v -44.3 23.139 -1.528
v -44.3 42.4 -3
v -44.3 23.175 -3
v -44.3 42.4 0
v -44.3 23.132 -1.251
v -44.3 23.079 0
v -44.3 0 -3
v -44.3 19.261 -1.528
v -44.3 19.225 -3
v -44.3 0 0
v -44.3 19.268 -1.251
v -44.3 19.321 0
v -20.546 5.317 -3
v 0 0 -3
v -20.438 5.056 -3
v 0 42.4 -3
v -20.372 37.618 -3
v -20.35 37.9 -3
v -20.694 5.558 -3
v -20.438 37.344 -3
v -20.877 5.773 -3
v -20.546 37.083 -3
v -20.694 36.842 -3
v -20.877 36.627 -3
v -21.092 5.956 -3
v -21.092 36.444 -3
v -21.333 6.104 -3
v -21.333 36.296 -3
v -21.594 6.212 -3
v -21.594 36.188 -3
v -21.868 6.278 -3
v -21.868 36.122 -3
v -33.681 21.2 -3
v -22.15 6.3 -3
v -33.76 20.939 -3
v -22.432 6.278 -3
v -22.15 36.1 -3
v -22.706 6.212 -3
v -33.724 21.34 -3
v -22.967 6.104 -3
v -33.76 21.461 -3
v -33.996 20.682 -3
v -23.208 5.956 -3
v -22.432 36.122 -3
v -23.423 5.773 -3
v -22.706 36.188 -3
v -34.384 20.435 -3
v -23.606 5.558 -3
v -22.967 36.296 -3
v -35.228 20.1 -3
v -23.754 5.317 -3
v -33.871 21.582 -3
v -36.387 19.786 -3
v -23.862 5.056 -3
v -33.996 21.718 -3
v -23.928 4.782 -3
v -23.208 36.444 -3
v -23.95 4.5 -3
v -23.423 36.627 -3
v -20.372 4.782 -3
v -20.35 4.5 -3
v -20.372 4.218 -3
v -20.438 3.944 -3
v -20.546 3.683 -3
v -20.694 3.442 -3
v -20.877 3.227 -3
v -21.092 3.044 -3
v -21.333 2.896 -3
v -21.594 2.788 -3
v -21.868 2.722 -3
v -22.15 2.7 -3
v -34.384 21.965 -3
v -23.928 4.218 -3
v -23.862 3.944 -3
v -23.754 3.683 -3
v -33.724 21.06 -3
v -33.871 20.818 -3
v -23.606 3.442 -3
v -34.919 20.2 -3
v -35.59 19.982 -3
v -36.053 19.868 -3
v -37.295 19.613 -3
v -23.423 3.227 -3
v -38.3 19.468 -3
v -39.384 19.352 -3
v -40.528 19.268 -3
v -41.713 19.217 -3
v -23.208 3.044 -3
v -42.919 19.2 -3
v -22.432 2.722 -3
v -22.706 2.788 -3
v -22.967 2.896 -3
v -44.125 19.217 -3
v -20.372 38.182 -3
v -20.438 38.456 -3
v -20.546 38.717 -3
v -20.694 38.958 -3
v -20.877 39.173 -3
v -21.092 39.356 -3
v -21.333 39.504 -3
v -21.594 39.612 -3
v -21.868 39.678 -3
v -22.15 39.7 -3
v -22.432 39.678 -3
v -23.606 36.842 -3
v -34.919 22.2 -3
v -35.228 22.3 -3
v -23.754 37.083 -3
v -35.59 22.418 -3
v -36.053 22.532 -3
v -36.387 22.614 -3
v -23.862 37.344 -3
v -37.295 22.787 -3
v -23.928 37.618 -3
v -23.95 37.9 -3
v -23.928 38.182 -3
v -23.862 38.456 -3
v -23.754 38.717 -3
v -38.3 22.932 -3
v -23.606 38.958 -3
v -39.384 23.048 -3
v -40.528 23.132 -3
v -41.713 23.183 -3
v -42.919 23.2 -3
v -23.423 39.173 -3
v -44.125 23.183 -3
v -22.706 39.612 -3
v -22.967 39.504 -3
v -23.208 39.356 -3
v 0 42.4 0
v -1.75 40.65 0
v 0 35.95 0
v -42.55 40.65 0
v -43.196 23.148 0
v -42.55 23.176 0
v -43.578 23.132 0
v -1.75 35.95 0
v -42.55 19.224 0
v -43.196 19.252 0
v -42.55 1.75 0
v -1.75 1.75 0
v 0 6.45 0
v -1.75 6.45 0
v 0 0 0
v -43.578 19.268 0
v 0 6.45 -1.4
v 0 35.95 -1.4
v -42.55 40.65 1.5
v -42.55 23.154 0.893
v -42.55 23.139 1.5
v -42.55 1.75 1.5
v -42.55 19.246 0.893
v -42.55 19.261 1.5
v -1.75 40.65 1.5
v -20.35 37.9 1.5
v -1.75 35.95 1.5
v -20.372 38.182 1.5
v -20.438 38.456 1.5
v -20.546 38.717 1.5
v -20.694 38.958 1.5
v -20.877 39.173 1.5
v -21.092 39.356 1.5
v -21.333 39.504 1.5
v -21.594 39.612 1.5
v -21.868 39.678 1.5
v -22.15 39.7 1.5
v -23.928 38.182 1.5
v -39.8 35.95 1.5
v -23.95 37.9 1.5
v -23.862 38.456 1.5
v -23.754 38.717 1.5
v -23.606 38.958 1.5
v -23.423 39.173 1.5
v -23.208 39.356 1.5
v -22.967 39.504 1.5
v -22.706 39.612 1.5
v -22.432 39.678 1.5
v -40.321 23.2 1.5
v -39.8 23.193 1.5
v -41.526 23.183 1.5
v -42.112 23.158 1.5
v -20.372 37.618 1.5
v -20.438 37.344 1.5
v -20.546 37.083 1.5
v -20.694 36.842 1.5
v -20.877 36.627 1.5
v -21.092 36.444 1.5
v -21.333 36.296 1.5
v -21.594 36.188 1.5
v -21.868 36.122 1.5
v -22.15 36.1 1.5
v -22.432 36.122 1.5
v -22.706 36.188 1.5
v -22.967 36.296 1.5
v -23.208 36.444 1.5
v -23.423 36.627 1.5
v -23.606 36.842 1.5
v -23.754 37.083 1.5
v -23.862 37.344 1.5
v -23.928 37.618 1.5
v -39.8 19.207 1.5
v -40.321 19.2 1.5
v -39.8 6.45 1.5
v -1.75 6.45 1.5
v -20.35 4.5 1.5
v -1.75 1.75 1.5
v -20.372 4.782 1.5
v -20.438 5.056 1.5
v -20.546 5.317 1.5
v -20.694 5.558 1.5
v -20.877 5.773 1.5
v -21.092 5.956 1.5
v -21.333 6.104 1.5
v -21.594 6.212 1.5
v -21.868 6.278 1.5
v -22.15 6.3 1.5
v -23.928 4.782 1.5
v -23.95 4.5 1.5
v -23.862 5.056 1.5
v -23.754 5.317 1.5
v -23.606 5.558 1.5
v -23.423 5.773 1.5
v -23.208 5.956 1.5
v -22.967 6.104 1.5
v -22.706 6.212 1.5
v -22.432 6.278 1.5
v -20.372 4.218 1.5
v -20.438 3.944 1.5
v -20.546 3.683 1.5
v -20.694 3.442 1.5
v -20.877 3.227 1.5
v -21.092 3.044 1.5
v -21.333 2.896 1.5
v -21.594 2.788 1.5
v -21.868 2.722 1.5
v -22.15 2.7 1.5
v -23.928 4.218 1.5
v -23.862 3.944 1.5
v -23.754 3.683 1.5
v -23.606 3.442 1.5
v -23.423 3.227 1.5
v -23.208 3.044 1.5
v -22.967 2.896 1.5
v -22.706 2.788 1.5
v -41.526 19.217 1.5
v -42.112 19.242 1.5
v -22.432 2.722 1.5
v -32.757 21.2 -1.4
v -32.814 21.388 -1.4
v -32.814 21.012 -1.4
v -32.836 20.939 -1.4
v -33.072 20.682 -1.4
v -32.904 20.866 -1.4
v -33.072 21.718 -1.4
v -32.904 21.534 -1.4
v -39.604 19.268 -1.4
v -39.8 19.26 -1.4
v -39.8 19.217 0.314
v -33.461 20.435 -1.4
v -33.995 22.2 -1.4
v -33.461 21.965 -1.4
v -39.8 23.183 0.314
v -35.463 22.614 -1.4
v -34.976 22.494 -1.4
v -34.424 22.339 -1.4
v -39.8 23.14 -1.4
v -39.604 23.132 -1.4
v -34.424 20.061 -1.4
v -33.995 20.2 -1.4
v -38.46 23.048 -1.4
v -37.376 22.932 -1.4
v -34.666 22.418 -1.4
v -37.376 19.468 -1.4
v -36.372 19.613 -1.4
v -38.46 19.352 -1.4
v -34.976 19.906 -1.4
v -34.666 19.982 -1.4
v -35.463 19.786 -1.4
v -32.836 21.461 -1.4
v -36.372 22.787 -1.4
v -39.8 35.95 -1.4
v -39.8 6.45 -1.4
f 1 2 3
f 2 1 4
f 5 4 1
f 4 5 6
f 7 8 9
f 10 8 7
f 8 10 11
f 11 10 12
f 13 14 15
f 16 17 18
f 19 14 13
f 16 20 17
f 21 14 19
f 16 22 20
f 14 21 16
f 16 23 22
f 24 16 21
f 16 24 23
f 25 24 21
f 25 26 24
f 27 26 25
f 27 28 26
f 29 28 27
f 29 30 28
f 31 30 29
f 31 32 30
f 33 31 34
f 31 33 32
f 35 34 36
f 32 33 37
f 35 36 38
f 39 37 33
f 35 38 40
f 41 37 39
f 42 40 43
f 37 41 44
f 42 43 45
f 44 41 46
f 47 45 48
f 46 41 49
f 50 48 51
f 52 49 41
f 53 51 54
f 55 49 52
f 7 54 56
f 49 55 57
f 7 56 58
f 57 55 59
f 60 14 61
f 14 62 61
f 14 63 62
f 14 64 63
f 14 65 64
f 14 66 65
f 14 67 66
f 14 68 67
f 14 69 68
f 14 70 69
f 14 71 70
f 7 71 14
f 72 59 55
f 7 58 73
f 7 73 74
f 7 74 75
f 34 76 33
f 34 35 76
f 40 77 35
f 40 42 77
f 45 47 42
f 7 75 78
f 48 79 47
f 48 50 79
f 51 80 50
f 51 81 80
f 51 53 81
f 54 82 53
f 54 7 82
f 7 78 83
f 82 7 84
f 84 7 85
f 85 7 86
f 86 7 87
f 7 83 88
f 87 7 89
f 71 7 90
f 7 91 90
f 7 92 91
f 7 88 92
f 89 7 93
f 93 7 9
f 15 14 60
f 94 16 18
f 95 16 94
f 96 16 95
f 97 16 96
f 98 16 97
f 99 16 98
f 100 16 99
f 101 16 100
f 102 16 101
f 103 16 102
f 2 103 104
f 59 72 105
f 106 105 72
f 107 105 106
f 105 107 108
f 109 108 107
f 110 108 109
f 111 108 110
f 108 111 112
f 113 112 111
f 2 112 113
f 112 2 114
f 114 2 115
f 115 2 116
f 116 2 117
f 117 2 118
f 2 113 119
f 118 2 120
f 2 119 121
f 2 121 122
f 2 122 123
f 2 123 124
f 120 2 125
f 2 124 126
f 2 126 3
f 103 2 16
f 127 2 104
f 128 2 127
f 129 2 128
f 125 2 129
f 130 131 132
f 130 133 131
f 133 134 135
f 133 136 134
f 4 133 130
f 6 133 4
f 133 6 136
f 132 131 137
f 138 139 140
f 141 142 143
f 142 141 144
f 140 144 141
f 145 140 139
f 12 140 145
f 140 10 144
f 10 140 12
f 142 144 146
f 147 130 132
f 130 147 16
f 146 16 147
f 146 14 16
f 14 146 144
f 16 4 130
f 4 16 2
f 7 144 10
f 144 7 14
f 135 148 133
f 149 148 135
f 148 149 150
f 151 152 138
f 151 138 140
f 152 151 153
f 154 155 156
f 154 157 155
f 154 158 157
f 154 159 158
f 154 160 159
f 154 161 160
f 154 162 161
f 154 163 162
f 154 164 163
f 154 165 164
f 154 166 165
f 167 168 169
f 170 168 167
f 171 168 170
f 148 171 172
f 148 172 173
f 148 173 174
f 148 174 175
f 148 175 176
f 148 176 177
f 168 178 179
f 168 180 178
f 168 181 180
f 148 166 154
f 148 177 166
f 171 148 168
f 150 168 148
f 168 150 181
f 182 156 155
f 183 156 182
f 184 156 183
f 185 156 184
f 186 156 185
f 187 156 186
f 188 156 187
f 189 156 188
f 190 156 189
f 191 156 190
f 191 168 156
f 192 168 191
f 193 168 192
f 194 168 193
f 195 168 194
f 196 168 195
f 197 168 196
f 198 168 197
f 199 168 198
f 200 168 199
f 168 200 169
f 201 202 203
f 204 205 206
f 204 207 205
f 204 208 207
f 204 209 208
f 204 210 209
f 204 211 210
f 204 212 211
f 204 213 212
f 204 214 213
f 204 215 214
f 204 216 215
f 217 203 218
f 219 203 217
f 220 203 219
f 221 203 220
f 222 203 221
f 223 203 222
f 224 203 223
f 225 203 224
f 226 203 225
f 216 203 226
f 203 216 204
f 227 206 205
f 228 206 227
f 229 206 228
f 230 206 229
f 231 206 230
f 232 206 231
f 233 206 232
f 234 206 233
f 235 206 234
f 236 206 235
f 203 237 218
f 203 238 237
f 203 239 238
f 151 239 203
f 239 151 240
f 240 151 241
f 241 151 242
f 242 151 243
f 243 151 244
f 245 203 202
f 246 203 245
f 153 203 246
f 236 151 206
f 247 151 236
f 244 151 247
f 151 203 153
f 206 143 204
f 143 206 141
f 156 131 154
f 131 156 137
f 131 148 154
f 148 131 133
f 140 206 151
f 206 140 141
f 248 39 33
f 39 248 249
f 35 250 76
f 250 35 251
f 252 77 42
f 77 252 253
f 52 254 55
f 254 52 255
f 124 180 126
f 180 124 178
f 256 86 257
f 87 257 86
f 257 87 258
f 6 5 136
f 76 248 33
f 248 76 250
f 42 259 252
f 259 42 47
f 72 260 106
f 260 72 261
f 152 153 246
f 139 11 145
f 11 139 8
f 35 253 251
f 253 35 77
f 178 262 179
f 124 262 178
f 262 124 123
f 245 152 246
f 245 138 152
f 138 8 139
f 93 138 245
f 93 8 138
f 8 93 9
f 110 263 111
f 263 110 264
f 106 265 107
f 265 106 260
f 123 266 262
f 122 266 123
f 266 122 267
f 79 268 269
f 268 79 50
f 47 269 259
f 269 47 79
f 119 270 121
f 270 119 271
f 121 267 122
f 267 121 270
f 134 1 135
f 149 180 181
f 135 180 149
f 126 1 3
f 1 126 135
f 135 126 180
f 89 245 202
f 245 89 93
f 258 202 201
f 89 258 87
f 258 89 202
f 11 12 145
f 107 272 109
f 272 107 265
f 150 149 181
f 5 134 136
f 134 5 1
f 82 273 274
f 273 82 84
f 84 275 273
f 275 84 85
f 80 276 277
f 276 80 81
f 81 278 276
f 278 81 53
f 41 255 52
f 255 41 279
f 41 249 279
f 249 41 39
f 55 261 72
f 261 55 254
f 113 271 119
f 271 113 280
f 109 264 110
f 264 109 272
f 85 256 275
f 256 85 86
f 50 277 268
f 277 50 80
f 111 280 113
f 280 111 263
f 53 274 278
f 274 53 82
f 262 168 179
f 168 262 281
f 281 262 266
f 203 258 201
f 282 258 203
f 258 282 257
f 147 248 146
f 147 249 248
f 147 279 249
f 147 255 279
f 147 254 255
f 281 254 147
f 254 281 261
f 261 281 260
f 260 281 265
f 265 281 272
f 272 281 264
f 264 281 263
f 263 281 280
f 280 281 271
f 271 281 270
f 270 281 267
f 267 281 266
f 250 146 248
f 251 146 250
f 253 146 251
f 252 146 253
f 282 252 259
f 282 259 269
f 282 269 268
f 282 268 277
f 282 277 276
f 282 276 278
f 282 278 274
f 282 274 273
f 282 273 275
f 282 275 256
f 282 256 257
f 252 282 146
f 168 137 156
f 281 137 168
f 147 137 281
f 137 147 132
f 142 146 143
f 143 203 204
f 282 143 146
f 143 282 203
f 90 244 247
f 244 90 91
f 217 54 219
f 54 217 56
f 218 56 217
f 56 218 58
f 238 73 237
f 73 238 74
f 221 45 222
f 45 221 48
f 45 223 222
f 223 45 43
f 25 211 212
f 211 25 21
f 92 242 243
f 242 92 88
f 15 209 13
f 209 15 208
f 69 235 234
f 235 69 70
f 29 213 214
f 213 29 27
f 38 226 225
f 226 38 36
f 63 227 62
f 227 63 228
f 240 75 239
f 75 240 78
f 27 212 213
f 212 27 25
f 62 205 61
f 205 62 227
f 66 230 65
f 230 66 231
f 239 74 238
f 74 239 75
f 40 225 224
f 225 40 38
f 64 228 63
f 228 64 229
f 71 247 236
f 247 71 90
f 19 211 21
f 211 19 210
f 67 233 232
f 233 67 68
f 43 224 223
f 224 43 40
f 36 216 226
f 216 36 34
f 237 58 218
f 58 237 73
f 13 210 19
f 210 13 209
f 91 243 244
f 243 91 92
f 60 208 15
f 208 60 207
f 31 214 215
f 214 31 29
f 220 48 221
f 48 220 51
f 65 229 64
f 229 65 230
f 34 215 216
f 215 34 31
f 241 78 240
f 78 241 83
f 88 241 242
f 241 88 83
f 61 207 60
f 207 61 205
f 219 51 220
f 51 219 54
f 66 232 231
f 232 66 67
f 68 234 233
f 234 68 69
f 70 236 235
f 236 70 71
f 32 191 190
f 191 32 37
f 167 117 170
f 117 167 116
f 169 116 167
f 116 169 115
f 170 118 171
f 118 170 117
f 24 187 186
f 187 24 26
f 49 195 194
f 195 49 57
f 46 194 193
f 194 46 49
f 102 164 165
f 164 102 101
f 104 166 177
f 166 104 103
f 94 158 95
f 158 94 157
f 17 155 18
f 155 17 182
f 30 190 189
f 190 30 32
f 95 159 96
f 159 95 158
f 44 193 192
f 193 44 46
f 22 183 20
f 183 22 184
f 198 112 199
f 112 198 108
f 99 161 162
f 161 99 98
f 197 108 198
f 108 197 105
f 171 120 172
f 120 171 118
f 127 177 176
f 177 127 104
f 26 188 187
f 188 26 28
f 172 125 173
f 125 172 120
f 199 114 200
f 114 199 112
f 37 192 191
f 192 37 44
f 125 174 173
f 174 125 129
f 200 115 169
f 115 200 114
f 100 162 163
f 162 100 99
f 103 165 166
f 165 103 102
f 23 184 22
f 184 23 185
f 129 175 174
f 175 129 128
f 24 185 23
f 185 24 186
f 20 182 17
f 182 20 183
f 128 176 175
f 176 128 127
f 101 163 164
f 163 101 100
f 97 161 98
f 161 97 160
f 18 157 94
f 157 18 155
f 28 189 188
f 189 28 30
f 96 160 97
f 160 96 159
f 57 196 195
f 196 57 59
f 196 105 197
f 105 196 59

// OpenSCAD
/*
modular enclosure for ESP32-S2 style of wemos D1 Mini 
current shell lid is for a style of relay 
MIT 
Copyright 2023 James Dodgen

Permission is hereby granted, free of charge, to any person obtaining a copy of this software and associated documentation files (the “Software”), 
to deal in the Software without restriction, including without limitation the rights to use, copy, modify, merge, publish, distribute, 
sublicense, and/or sell copies of the Software, and to permit persons to whom the Software is furnished to do so, subject to the following conditions:

The above copyright notice and this permission notice shall be included in all copies or substantial portions of the Software.

THE SOFTWARE IS PROVIDED “AS IS”, WITHOUT WARRANTY OF ANY KIND, EXPRESS OR IMPLIED, INCLUDING BUT NOT LIMITED TO THE WARRANTIES OF MERCHANTABILITY, 
FITNESS FOR A PARTICULAR PURPOSE AND NONINFRINGEMENT. IN NO EVENT SHALL THE AUTHORS OR COPYRIGHT HOLDERS BE LIABLE FOR ANY CLAIM, 
DAMAGES OR OTHER LIABILITY, WHETHER IN AN ACTION OF CONTRACT, TORT OR OTHERWISE, ARISING FROM, OUT OF OR IN 
CONNECTION WITH THE SOFTWARE OR THE USE OR OTHER DEALINGS IN THE SOFTWARE.

version 1.1
*/

type = "proto"; //"cpu"; "relay"; "proto";

make_somthing = 2;    // 1 base, 2=lid, 3 buttons
if (make_somthing == 1) {
    make_s2_base();
} else if (make_somthing == 2) {
    make_relay_lid();
} else if (make_somthing == 3) {
    make_button();
    translate([6,0,0]) 
        make_button(long=true); // two needed, short for the "O" long for the "RST"
}

Mx_fn = 12; // self tapping 
M3_screw_hole = 2.8; 
M3_clearence_hole = 3.6; 
M3_head_clearence_hole = 6.3;

M2_5_screw_hole = 2.7; 
M2_5_clearence_hole = 3.1; 
M2_5_head_clearence_hole = 6.2;

M2_screw_hole = 2.16; 
M2_clearence_hole = 2.6; 

drill_length = 20;


shell_x = 34.3 + 10;   // adjustments off of S2 D1 Mini
shell_y = 25.4 + 17;

shell_z = 20;
shell_wall_thickness = 1.5;
shell_post_d = 7;



module make_s2_base() {
    difference()
    {
        union()
        {
            make_s2_mini_mount(front_stops=false);
            translate([-(shell_x-s2_x)+shell_wall_thickness,(-(shell_y-s2_y)/2),0])
            {
                shell();
            }
        }
        make_s2_mini_mount_cutout();
    }
}

lid_mount_Loc_1 = [shell_x/2,shell_wall_thickness,shell_z-2];
lid_mount_Loc_2 = [shell_x/2,shell_y-shell_wall_thickness,shell_z-2];

//shell();
module shell()
{
    difference()
    {
        cube([shell_x, shell_y, shell_z]) ;
        translate([shell_wall_thickness, shell_wall_thickness ,shell_wall_thickness])
        {
            cube([shell_x - (shell_wall_thickness*2), shell_y-shell_wall_thickness*2, shell_z]);
        }
        mid_y = shell_y/2;
        make_slot([0,mid_y,3],height=shell_z-5);
        make_slot([0,mid_y+4,3],height=shell_z-5);
        make_slot([0,mid_y-4,3],height=shell_z-5);
        make_slot([0,mid_y+8,3],height=shell_z-5);
        make_slot([0,mid_y-8,3],height=shell_z-5);
        make_slot([0,mid_y-12,3],height=shell_z-5);
        make_slot([0,mid_y+12,3],height=shell_z-5);
        make_slot([0,mid_y-16,3],height=shell_z-5);
        make_slot([0,mid_y+16,3],height=shell_z-5);
        translate([33,0.5,9])
            rotate([90,0,0])
                center_text("R", size=5, extrude=1.2);
        translate([33,shell_y+0.7,9])
            rotate([90,0,0])
                center_text("O", size=5, extrude=1.2);       
        
    }
    lid_mount(lid_mount_Loc_1, rot=0);
    lid_mount(lid_mount_Loc_2, rot=180); 
}

//make_relay_lid();
module make_relay_lid()
{
    hat_x = 32;
    hat_y = 26.5;
    lip_depth = 1.9;
    shrinkage = 0.25;
    lip_width = 4.7;

    rotate([0,180.0])  // print upside down
    difference()
    {
        union()
        {
            difference()
            {
                slop = (shrinkage+shell_wall_thickness);
                lip_x = shell_x-slop*2;
                lip_y = shell_y-slop*2;
                union()
                {
                    color("orange") cube([shell_x, shell_y, shell_wall_thickness*2]);
                    if (type == "cpu")   // make usb-c hold down post
                    {
                        height= 9;
                        width=5;
                        translate([3,(shell_y-width)/2, -height]) cube([2,width,height]);
                    }
                    difference()
                    {
                        translate([shrinkage+shell_wall_thickness, shrinkage+shell_wall_thickness,-shell_wall_thickness])
                        {
                            color("green") cube([lip_x, lip_y, lip_depth]);
                        }
                    }
                }
                
                if (type == "relay" ||  type == "cpu")
                {
                    cut_out_x = lip_x-lip_width*2;
                    cut_out_y = lip_y-lip_width*2;
                    translate([shrinkage+shell_wall_thickness, shrinkage+shell_wall_thickness,-shell_wall_thickness+1])
                        translate([(lip_x-cut_out_x)/2,(lip_y-cut_out_y)/2,-shell_wall_thickness])
                                    cube([cut_out_x, cut_out_y, lip_depth+shell_wall_thickness]);
                }
                if (type == "relay") // cut out relay slot
                 {
                    translate([shell_x-hat_x,(shell_y - hat_y)/2,-10]) 
                        cube([hat_x, hat_y, 20]);
                 }
                if (type == "proto")  // add slot for some wires
                {
                    // cut wire hole
                    translate([shell_x-6,(shell_y)/2, -5]) 
                        rotate([0,30,0])
                            scale([4,1,1])
                                cylinder(h = 10, r = 2, $fn=48);
                    // make room for proto board
                    cut_out_x = lip_x;
                    cut_out_y = lip_y-lip_width*2;
                    translate([-1, shrinkage+shell_wall_thickness,-shell_wall_thickness+1])
                        translate([(lip_x-cut_out_x)/2,(lip_y-cut_out_y)/2,-shell_wall_thickness])
                                    cube([cut_out_x, cut_out_y, lip_depth+shell_wall_thickness]);
                }
                lid_mount_clearance_hole(lid_mount_Loc_1, rot=0);
                lid_mount_clearance_hole(lid_mount_Loc_2, rot=180);

            relay_y = 16.2;
            relay_x= 31;
            relay_z = 10;
            
            *difference()  // resess for pcb
            {
                translate([shell_x-relay_x-2,(shell_y - hat_y-2)/2,shell_wall_thickness+0.3]) 
                    color("blue") cube([relay_x+2,hat_y+2,-(shell_wall_thickness-0.3)]);
                translate([shell_x-relay_x,(shell_y - relay_y)/2,0]) 
                    cube([relay_x,relay_y,relay_z]);
            }
        }
        }
        if (type == "relay")
        {
            /// relay cut outs for led and letters
            *translate([0,0,drill_length/2+shell_wall_thickness]) {
                lid_mount_clearance_hole(lid_mount_Loc_1, rot=0,hole_size=M3_head_clearence_hole);
                lid_mount_clearance_hole(lid_mount_Loc_2, rot=180,hole_size=M3_head_clearence_hole); 
            }
            translate([41,7,2])
                rotate([0,0,90])
                    center_text("NO", size=5, extrude=2);  
            translate([41,35,2])
                rotate([0,0,90])
                    center_text("NC", size=5, extrude=1.2);  
            // LED cutout
            translate([35,30,-5])
                    cube([3,4,20]);
        } 
    }
}

module lid_mount(xyz,  width=6, height=8, rot=0) {
    
    echo ("rotate", rot);
    if (rot == 0) { 
        translate([xyz.x+width/2, xyz.y, xyz.z])
            rotate([0,180,rot])
                raw_lid_mount(width=6, height=8);
    } else if ((rot == -90) || (rot == 270 )) {
        translate([xyz.x, xyz.y-width/2, xyz.z])
            rotate([0,180,rot])
                raw_lid_mount(width=6, height=8);
    } else if (rot == 90) {
        translate([xyz.x, xyz.y+width/2, xyz.z])
            rotate([0,180,rot])
                raw_lid_mount(width=6, height=8);
    } else if (rot == 180) {
        translate([xyz.x-width/2, xyz.y, xyz.z])
            rotate([0,180,rot])
                raw_lid_mount(width=6, height=8);
    }
}

//lid_mount([10,10,-2], rot=180); 
//lid_mount_clearance_hole([10,10,-2], rot=180); 
module lid_mount_clearance_hole(xyz,  width=6, height=8, rot=0, hole_size=M3_clearence_hole) {
 
    echo ("rotate", rot);
    if (rot == 0) { 
        translate([xyz.x, xyz.y+width/2, -drill_length/2])
           cylinder(h=drill_length, d=hole_size, $fn=40);
    } else if ((rot == -90) || (rot == 270 )) {
        translate([xyz.x+width/2, xyz.y, -drill_length/2])
            cylinder(h=drill_length, d=hole_size, $fn=40);
    } else if (rot == 90) {
        translate([xyz.x-width/2, xyz.y, -drill_length/2])
            cylinder(h=drill_length, d=hole_size, $fn=40);
    } else if (rot == 180) {
        translate([xyz.x, xyz.y-width/2, -drill_length/2])
            cylinder(h=drill_length, d=hole_size, $fn=40);   
    }
}

//raw_lid_mount();
module raw_lid_mount(width=6, height=8) {
    raw_height =20;
    //screw_depth= height*0.75;
    difference() 
    { 
        cube([width, width,raw_height]);			
        // chop off at 45 
        rotate([-45,0,0]) 
            translate([0,-50,height])
                cube([width, 100, raw_height*2]);		
        // screw hole
        translate([width/2, width/2,-2]) 
            cylinder(h=raw_height, d=M3_screw_hole, $fn=Mx_fn);                  
        translate([width/2,width/2,-2]) 
            fillet(180,width/2, raw_height+2, $fn=30);
        translate([0,width/2,-2]) 
                fillet(-90,width/2, raw_height+2, $fn=30);
    }                   
}

*difference() {
    make_s2_mini_mount(button_guides=false);
    make_s2_mini_mount_cutout();
    //translate([10,-50,0]) cube([100,100,100]);
}

/* 
START Wemos S2 Mini mount code
*/
s2_y=25.4;
s2_x=34.3;
s2_thickness=4;

total_height = s2_thickness+3;
usb_c_hole_width = 14;
usb_c_hole_height = 9;

hole_offset_x = 3; 
hole1_offset_y = 2.5;
hole2_offset_y= hole1_offset_y+20.4;  

hole1_loc = [hole_offset_x, hole1_offset_y,0];
hole2_loc = [hole_offset_x, hole2_offset_y,0];
post_d = M2_screw_hole+1.5;
button_hole_d = 4;
module make_s2_mini_mount(button_guides=true, front_stops=true)
{
    
    suport_x = s2_x - post_d/2;
    suport_post1_loc = [suport_x, hole1_offset_y+1, 0];
    suport_post2_loc = [suport_x, hole2_offset_y, 0];
    
    translate([-1,-1,0]) cube([s2_x+2,s2_y+2,s2_thickness]);
    if (button_guides == true) {
        translate([s2_x-8,-3.5,0]) 
            cube([8, 2, 13]);
        translate([s2_x-8,s2_y+3,0]) 
            cube([8, 2, 13]);
    }
    post(hole1_loc, total_height, post_d);
    post(hole2_loc, total_height, post_d);
    post(suport_post1_loc, total_height, post_d);
    post(suport_post2_loc, total_height, post_d);

    // side supports
    translate([-2.4,-2.3,0]) cube([28,2,10]);
    translate([-2.4,s2_y+0.3,0]) cube([29,2,10]);

    // end sppports
    translate([-2.4, -0.5, 0]) cube([2,5,10]);
    translate([-2.4, s2_y-5+0.5, 0]) cube([2,5,10]);
    
    if (front_stops == true) {  // where usb-c is
        translate([s2_x+0.5, -0.2, 0]) cube([2,5,10]);
        translate([s2_x+0.5, s2_y-5+0.2, 0]) cube([2,5,10]);
    }
}

//make_button();
module make_button(long=false) 
{
  lth=long?11:9;
  cylinder(h = lth , d = button_hole_d*0.8, $fn = 40); 
  cylinder(h = 1 , d = 4.5, $fn = 40); 
}

module make_s2_mini_mount_cutout()
{
    {
        screw_hole(hole1_loc, total_height, M2_screw_hole);
        screw_hole(hole2_loc, total_height, M2_screw_hole);
        antenna_cutout();
        color("purple")
        {
        //base_x = s2_x; // + 10;
        //base_y = s2_y; // + 17;
        //base_z = 20;
        //base_wall_thickness = 1.5;
            
        translate([s2_x+0.5, (s2_y-usb_c_hole_width)/2, s2_thickness+1])
            usb_c_hole();
        
       translate([s2_x-3.9, 0.5, s2_thickness+5]) 
            rotate([90,0.0])
                cylinder(h = 20 , d = button_hole_d, $fn = 40, center=false);
        
       translate([s2_x-3.9, s2_y, s2_thickness+5.2]) 
            rotate([270,0.0])
                cylinder(h = 20, d = button_hole_d, $fn = 40, center=false);
        }
    }
}

module post(loc,height, diameter) {
    translate(loc)
        cylinder(h=height, d=diameter, $fn=30);
}

module screw_hole(loc,height, screw_hole)
{
    translate(loc)
        cylinder(h=height, d=screw_hole, $fn=Mx_fn); 
        // fn=Mx_fn makes it self threading
}
module antenna_cutout()
{
    translate([-1,hole1_offset_y+(post_d/2)+0.7,0])
        cube([7, s2_y-hole1_offset_y-(post_d*2), s2_thickness]);
}

//usb_c_hole();
module usb_c_hole()
{
    cut_out_height = 20; //base_wall_thickness+4;
    translate([-2,usb_c_hole_height/2,usb_c_hole_height/2])
    {
        color("green") 
        rotate([0,90,0])
            cylinder(h = cut_out_height, d = usb_c_hole_height, center=false, $fn = 60);
    }
    translate([-2, usb_c_hole_width-(usb_c_hole_height/2), usb_c_hole_height/2])
    {
        color("orange") 
        rotate([0,90,0])
            cylinder(h = cut_out_height, d = usb_c_hole_height, center=false, $fn = 60);
    }
    filler_block = usb_c_hole_width-usb_c_hole_height-0.2;
    translate([-2,filler_block,0])
        cube ([cut_out_height, filler_block, usb_c_hole_height]);
    
    *translate([0.1,0,0])
        cube ([shell_wall_thickness, usb_c_hole_width, usb_c_hole_height]);
}
/*
END  wemos s2 mini mount */

// service routines

module fillet(rot, r, h) {
    translate([r / 2, r / 2, h/2])
    rotate([0,0,rot]) difference() {
        cube([r + 0.01, r + 0.01, h], center = true);
        translate([r/2, r/2, 0])
            cylinder(r = r, h = h + 1, center = true);
    }
}

//make_slot([0,0,0,]);
//make_slot([0,0,0,], rotate=1);
module make_slot(s, rotate=0, width=1.7, height=10) {
	thickness = 5;

    if (rotate == 1)	
    {
        translate([s.x-width/2, s.y-thickness/2, s.z])
        cube([width, thickness, height]);		
    }
    else
    {
        translate([s.x-thickness/2, s.y, s.z])
        cube([thickness, width, height]);
    }

}

module center_text(text, size, font="Liberation Mono:style=bold", width=0, length=0, extrude=0.6) {
    $fn = 30;
    translate([length, width, 0]) 
        linear_extrude(extrude) 
            text(text, size=size, font=font, halign="center", valign="center");
}
